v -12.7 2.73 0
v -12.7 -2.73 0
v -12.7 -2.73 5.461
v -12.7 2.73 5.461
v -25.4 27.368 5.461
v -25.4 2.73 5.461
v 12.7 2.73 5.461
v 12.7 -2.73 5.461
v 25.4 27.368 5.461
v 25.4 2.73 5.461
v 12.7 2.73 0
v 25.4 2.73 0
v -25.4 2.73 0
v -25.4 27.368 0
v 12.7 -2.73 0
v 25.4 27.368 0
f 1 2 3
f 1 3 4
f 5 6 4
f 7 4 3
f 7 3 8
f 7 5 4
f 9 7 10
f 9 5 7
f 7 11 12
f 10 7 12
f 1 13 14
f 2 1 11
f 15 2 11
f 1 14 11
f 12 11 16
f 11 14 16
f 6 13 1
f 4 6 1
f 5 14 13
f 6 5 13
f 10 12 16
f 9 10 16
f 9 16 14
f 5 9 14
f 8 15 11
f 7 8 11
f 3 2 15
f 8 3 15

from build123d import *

# Parameters (mm, degrees)
SKETCH1_W           = 25.4
SKETCH1_H           = 5.461
BOSS_EXTRUDE1_DEPTH = 5.461


with BuildPart() as part:
    # Sketch1 → Boss-Extrude1 (new body)
    with BuildSketch(Plane.XY):
        Polygon((-25.4, 2.7305), (-12.7, 2.7305), (12.7, 2.7305), (25.4, 2.7305), (25.4, 27.3685), (-25.4, 27.3685), align=None)
        Rectangle(SKETCH1_W, SKETCH1_H)
    extrude(amount=BOSS_EXTRUDE1_DEPTH)


solid = part.part
